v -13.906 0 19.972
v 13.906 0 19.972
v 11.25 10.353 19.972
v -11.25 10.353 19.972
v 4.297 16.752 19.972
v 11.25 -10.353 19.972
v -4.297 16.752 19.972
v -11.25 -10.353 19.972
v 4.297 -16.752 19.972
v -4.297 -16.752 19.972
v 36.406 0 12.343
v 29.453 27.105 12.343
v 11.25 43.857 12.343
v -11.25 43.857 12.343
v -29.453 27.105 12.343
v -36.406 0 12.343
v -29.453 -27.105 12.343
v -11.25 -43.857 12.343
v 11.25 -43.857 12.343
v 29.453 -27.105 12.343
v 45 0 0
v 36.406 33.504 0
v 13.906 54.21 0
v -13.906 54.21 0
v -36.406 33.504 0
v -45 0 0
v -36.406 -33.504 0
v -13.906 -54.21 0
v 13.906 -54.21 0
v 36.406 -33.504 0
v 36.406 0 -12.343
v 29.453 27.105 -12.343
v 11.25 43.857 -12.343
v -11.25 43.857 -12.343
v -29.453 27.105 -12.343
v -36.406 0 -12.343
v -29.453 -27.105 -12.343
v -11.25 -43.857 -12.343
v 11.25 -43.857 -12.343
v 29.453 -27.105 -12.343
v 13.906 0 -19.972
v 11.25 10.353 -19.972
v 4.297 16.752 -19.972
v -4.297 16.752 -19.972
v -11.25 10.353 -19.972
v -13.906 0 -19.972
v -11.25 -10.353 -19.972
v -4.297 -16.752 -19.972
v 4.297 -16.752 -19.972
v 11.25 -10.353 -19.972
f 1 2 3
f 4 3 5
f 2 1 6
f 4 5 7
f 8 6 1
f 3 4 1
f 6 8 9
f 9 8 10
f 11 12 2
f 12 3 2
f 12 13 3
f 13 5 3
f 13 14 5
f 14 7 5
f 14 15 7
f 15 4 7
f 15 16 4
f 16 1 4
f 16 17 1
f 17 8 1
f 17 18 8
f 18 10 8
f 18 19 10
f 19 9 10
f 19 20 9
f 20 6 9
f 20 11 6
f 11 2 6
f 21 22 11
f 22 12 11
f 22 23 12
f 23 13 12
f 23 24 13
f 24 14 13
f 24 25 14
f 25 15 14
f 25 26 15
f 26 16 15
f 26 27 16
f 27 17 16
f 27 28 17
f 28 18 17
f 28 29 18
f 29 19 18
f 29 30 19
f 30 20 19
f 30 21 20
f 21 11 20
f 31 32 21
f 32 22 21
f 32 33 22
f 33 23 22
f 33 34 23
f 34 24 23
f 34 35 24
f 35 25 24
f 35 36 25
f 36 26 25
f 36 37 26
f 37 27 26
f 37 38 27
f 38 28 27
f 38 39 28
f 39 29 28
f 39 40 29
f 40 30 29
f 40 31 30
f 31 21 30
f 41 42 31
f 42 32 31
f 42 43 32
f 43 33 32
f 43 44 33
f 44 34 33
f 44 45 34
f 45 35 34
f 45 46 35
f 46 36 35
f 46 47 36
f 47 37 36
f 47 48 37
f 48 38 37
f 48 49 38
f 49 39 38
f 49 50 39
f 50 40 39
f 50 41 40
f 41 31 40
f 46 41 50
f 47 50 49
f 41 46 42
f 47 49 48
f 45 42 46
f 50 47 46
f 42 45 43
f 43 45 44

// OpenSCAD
// Generated by SolidPython 1.0.1 on 2020-07-29 00:46:52


scale(v = [15, 19, 7]) {
	sphere(r = 3);
}
/***********************************************
*********      SolidPython code:      **********
************************************************
 
# import packages: SolidPython
from solid import *
from solid.utils import *
from itertools import chain, combinations, permutations


class Resize:

    def __init__(self, scad_file):
        self.scad_file = scad_file
        #self.scad_file = import_scad(scad_file)
        # cone/cylinder param:
        self.r1 = 0
        self.r2 = 0
        self.h = 0
        # rectangular prism param:
        self.w = 0
        self.l = 0
        # ellipse param:
        self.r = 0

    # import OpenScad code (file name corresponds to shape)


    # classify shape + parameters
    def assign(self, param1, param2, param3):
        if self.scad_file == 'cone.scad':
            self.r1 = param1
            self.r2 = param2
            self.h = param3
        elif self.scad_file == 'cylinder.scad':
            self.r1 = param1
            self.r2 = param2
            self.h = param3
        elif self.scad_file == 'rectangularPrism.scad':
            self.h = param1
            self.l = param2
            self.w = param3
        else:
            self.r = param1
            self.h = param2

    # resize parameters
    def iterate(self):
        x = range(3, 20, 2)
        i = 1
        if self.scad_file == 'cone.scad':
            tempList = list(permutations(x, 2))
            for temp in tempList:
                param1 = temp[0]
                param2 = temp[1]
                filepath = 'produced_scad_files/' + 'cone' + str(param1) + '_' + str(param2) + '_' + '.scad'
                scad_render_to_file(cylinder(h=param1, r1=param2, r2=0), filepath)

        elif self.scad_file == 'cylinder.scad':
            tempList = list(permutations(x, 3))
            for temp in tempList:
                param1 = temp[0]
                param2 = temp[1]
                filepath = 'produced_scad_files/' + 'cylinder' + str(param1) + '_' + str(param2) + '_' + '.scad'
                scad_render_to_file(cylinder(h=param1, r1=param2, r2=param2), filepath)

        elif self.scad_file == 'rectangularPrism.scad':
            tempList = list(permutations(x, 3))
            for temp in tempList:
                param1 = temp[0]
                param2 = temp[1]
                param3 = temp[2]
                filepath = 'produced_scad_files/' + 'rectangularPrism' + str(param1) + '_' + str(param2) + '_' + str(
                    param3) + '.scad'
                scad_render_to_file(cube(size=(param1, param2, param3)), filepath)

        elif self.scad_file == 'ellipse.scad':
            tempList = list(permutations(x, 4))
            for temp in tempList:
                param1 = temp[0]
                param2 = temp[1]
                param3 = temp[2]
                param4 = temp[3]
                filepath = 'produced_scad_files/' + 'ellipse' + str(param1) + '_' + str(param2) + '_' + str(param3) + '_' + str(param4) + '.scad'
                scad_render_to_file(scale([param1, param2, param3])(sphere(r=param4)), filepath)

    def render_to_scadfile(self):
        scad_render_to_file(scad, 'example.scad') 
 
************************************************/
